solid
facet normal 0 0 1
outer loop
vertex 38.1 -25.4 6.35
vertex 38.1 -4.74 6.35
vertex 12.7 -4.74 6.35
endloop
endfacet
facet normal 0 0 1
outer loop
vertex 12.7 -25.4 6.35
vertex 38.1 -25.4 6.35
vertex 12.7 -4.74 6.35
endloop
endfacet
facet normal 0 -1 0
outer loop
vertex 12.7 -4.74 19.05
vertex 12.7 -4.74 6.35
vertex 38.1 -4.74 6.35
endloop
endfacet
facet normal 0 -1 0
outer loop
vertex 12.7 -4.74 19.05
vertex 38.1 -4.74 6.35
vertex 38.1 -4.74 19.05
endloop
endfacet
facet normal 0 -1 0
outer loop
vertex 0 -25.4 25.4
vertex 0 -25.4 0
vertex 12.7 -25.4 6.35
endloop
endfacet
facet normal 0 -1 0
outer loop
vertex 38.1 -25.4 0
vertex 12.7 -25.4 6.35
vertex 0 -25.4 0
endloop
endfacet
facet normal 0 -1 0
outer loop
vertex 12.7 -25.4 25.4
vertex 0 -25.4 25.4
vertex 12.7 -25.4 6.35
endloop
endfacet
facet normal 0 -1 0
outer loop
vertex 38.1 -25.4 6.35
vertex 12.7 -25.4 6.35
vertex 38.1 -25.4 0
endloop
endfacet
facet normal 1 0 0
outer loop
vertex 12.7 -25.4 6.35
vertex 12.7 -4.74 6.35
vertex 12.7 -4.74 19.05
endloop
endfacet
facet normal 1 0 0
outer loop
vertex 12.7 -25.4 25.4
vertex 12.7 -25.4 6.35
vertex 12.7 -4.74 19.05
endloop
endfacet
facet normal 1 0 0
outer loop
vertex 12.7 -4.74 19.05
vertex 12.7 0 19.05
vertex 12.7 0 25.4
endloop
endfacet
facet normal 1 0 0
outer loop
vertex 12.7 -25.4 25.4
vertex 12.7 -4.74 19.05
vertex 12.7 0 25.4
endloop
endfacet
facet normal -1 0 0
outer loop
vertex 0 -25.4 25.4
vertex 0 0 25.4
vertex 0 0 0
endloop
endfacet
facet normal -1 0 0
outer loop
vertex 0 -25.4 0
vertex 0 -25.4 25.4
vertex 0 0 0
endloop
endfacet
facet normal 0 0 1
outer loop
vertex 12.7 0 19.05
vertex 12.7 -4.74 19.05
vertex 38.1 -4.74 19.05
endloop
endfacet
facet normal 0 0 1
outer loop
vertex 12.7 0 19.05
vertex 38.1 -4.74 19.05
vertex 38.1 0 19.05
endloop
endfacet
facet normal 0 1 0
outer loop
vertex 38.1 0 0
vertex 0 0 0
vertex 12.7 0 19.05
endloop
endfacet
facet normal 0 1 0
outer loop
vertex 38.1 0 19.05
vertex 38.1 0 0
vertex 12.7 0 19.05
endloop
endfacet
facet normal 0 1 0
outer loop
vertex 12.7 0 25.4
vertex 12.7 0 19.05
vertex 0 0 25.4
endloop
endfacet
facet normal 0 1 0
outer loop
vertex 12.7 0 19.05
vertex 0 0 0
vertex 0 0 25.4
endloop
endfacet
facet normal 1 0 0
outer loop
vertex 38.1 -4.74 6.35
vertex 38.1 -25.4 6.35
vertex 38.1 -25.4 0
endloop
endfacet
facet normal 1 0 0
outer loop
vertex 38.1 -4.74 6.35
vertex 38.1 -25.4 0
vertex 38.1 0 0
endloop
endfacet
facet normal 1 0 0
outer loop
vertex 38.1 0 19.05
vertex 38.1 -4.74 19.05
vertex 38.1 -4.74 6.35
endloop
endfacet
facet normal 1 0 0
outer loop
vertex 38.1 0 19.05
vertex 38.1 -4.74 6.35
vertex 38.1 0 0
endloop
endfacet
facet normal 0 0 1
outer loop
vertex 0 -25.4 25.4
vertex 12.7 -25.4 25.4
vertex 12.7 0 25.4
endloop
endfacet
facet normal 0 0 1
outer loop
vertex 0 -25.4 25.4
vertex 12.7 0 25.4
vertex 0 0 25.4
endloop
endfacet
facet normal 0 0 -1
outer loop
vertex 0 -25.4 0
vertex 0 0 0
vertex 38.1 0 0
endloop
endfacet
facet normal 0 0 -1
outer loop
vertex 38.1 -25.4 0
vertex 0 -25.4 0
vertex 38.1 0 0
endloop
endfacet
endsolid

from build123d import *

# Parameters (mm, degrees)
F1_DEPTH = 25.4
F2_W     = 4.7399289906
F2_H     = 12.7
F3_DEPTH = 25.4


with BuildPart() as f1:
    # F0 (on Front) → F1 (new body)
    with BuildSketch(Plane.XZ):
        Polygon((0, 25.4), (0, 0), (38.1, 0), (38.1, 6.35), (12.7, 6.35), (12.7, 25.4), align=None)
    extrude(amount=F1_DEPTH)

    # F2 (on face) → F3 (join)
    with BuildSketch(Plane.YZ.offset(12.7)):
        with Locations((-2.3699644953, 12.7)):
            Rectangle(F2_W, F2_H)
    extrude(amount=F3_DEPTH)


solid = f1.part
